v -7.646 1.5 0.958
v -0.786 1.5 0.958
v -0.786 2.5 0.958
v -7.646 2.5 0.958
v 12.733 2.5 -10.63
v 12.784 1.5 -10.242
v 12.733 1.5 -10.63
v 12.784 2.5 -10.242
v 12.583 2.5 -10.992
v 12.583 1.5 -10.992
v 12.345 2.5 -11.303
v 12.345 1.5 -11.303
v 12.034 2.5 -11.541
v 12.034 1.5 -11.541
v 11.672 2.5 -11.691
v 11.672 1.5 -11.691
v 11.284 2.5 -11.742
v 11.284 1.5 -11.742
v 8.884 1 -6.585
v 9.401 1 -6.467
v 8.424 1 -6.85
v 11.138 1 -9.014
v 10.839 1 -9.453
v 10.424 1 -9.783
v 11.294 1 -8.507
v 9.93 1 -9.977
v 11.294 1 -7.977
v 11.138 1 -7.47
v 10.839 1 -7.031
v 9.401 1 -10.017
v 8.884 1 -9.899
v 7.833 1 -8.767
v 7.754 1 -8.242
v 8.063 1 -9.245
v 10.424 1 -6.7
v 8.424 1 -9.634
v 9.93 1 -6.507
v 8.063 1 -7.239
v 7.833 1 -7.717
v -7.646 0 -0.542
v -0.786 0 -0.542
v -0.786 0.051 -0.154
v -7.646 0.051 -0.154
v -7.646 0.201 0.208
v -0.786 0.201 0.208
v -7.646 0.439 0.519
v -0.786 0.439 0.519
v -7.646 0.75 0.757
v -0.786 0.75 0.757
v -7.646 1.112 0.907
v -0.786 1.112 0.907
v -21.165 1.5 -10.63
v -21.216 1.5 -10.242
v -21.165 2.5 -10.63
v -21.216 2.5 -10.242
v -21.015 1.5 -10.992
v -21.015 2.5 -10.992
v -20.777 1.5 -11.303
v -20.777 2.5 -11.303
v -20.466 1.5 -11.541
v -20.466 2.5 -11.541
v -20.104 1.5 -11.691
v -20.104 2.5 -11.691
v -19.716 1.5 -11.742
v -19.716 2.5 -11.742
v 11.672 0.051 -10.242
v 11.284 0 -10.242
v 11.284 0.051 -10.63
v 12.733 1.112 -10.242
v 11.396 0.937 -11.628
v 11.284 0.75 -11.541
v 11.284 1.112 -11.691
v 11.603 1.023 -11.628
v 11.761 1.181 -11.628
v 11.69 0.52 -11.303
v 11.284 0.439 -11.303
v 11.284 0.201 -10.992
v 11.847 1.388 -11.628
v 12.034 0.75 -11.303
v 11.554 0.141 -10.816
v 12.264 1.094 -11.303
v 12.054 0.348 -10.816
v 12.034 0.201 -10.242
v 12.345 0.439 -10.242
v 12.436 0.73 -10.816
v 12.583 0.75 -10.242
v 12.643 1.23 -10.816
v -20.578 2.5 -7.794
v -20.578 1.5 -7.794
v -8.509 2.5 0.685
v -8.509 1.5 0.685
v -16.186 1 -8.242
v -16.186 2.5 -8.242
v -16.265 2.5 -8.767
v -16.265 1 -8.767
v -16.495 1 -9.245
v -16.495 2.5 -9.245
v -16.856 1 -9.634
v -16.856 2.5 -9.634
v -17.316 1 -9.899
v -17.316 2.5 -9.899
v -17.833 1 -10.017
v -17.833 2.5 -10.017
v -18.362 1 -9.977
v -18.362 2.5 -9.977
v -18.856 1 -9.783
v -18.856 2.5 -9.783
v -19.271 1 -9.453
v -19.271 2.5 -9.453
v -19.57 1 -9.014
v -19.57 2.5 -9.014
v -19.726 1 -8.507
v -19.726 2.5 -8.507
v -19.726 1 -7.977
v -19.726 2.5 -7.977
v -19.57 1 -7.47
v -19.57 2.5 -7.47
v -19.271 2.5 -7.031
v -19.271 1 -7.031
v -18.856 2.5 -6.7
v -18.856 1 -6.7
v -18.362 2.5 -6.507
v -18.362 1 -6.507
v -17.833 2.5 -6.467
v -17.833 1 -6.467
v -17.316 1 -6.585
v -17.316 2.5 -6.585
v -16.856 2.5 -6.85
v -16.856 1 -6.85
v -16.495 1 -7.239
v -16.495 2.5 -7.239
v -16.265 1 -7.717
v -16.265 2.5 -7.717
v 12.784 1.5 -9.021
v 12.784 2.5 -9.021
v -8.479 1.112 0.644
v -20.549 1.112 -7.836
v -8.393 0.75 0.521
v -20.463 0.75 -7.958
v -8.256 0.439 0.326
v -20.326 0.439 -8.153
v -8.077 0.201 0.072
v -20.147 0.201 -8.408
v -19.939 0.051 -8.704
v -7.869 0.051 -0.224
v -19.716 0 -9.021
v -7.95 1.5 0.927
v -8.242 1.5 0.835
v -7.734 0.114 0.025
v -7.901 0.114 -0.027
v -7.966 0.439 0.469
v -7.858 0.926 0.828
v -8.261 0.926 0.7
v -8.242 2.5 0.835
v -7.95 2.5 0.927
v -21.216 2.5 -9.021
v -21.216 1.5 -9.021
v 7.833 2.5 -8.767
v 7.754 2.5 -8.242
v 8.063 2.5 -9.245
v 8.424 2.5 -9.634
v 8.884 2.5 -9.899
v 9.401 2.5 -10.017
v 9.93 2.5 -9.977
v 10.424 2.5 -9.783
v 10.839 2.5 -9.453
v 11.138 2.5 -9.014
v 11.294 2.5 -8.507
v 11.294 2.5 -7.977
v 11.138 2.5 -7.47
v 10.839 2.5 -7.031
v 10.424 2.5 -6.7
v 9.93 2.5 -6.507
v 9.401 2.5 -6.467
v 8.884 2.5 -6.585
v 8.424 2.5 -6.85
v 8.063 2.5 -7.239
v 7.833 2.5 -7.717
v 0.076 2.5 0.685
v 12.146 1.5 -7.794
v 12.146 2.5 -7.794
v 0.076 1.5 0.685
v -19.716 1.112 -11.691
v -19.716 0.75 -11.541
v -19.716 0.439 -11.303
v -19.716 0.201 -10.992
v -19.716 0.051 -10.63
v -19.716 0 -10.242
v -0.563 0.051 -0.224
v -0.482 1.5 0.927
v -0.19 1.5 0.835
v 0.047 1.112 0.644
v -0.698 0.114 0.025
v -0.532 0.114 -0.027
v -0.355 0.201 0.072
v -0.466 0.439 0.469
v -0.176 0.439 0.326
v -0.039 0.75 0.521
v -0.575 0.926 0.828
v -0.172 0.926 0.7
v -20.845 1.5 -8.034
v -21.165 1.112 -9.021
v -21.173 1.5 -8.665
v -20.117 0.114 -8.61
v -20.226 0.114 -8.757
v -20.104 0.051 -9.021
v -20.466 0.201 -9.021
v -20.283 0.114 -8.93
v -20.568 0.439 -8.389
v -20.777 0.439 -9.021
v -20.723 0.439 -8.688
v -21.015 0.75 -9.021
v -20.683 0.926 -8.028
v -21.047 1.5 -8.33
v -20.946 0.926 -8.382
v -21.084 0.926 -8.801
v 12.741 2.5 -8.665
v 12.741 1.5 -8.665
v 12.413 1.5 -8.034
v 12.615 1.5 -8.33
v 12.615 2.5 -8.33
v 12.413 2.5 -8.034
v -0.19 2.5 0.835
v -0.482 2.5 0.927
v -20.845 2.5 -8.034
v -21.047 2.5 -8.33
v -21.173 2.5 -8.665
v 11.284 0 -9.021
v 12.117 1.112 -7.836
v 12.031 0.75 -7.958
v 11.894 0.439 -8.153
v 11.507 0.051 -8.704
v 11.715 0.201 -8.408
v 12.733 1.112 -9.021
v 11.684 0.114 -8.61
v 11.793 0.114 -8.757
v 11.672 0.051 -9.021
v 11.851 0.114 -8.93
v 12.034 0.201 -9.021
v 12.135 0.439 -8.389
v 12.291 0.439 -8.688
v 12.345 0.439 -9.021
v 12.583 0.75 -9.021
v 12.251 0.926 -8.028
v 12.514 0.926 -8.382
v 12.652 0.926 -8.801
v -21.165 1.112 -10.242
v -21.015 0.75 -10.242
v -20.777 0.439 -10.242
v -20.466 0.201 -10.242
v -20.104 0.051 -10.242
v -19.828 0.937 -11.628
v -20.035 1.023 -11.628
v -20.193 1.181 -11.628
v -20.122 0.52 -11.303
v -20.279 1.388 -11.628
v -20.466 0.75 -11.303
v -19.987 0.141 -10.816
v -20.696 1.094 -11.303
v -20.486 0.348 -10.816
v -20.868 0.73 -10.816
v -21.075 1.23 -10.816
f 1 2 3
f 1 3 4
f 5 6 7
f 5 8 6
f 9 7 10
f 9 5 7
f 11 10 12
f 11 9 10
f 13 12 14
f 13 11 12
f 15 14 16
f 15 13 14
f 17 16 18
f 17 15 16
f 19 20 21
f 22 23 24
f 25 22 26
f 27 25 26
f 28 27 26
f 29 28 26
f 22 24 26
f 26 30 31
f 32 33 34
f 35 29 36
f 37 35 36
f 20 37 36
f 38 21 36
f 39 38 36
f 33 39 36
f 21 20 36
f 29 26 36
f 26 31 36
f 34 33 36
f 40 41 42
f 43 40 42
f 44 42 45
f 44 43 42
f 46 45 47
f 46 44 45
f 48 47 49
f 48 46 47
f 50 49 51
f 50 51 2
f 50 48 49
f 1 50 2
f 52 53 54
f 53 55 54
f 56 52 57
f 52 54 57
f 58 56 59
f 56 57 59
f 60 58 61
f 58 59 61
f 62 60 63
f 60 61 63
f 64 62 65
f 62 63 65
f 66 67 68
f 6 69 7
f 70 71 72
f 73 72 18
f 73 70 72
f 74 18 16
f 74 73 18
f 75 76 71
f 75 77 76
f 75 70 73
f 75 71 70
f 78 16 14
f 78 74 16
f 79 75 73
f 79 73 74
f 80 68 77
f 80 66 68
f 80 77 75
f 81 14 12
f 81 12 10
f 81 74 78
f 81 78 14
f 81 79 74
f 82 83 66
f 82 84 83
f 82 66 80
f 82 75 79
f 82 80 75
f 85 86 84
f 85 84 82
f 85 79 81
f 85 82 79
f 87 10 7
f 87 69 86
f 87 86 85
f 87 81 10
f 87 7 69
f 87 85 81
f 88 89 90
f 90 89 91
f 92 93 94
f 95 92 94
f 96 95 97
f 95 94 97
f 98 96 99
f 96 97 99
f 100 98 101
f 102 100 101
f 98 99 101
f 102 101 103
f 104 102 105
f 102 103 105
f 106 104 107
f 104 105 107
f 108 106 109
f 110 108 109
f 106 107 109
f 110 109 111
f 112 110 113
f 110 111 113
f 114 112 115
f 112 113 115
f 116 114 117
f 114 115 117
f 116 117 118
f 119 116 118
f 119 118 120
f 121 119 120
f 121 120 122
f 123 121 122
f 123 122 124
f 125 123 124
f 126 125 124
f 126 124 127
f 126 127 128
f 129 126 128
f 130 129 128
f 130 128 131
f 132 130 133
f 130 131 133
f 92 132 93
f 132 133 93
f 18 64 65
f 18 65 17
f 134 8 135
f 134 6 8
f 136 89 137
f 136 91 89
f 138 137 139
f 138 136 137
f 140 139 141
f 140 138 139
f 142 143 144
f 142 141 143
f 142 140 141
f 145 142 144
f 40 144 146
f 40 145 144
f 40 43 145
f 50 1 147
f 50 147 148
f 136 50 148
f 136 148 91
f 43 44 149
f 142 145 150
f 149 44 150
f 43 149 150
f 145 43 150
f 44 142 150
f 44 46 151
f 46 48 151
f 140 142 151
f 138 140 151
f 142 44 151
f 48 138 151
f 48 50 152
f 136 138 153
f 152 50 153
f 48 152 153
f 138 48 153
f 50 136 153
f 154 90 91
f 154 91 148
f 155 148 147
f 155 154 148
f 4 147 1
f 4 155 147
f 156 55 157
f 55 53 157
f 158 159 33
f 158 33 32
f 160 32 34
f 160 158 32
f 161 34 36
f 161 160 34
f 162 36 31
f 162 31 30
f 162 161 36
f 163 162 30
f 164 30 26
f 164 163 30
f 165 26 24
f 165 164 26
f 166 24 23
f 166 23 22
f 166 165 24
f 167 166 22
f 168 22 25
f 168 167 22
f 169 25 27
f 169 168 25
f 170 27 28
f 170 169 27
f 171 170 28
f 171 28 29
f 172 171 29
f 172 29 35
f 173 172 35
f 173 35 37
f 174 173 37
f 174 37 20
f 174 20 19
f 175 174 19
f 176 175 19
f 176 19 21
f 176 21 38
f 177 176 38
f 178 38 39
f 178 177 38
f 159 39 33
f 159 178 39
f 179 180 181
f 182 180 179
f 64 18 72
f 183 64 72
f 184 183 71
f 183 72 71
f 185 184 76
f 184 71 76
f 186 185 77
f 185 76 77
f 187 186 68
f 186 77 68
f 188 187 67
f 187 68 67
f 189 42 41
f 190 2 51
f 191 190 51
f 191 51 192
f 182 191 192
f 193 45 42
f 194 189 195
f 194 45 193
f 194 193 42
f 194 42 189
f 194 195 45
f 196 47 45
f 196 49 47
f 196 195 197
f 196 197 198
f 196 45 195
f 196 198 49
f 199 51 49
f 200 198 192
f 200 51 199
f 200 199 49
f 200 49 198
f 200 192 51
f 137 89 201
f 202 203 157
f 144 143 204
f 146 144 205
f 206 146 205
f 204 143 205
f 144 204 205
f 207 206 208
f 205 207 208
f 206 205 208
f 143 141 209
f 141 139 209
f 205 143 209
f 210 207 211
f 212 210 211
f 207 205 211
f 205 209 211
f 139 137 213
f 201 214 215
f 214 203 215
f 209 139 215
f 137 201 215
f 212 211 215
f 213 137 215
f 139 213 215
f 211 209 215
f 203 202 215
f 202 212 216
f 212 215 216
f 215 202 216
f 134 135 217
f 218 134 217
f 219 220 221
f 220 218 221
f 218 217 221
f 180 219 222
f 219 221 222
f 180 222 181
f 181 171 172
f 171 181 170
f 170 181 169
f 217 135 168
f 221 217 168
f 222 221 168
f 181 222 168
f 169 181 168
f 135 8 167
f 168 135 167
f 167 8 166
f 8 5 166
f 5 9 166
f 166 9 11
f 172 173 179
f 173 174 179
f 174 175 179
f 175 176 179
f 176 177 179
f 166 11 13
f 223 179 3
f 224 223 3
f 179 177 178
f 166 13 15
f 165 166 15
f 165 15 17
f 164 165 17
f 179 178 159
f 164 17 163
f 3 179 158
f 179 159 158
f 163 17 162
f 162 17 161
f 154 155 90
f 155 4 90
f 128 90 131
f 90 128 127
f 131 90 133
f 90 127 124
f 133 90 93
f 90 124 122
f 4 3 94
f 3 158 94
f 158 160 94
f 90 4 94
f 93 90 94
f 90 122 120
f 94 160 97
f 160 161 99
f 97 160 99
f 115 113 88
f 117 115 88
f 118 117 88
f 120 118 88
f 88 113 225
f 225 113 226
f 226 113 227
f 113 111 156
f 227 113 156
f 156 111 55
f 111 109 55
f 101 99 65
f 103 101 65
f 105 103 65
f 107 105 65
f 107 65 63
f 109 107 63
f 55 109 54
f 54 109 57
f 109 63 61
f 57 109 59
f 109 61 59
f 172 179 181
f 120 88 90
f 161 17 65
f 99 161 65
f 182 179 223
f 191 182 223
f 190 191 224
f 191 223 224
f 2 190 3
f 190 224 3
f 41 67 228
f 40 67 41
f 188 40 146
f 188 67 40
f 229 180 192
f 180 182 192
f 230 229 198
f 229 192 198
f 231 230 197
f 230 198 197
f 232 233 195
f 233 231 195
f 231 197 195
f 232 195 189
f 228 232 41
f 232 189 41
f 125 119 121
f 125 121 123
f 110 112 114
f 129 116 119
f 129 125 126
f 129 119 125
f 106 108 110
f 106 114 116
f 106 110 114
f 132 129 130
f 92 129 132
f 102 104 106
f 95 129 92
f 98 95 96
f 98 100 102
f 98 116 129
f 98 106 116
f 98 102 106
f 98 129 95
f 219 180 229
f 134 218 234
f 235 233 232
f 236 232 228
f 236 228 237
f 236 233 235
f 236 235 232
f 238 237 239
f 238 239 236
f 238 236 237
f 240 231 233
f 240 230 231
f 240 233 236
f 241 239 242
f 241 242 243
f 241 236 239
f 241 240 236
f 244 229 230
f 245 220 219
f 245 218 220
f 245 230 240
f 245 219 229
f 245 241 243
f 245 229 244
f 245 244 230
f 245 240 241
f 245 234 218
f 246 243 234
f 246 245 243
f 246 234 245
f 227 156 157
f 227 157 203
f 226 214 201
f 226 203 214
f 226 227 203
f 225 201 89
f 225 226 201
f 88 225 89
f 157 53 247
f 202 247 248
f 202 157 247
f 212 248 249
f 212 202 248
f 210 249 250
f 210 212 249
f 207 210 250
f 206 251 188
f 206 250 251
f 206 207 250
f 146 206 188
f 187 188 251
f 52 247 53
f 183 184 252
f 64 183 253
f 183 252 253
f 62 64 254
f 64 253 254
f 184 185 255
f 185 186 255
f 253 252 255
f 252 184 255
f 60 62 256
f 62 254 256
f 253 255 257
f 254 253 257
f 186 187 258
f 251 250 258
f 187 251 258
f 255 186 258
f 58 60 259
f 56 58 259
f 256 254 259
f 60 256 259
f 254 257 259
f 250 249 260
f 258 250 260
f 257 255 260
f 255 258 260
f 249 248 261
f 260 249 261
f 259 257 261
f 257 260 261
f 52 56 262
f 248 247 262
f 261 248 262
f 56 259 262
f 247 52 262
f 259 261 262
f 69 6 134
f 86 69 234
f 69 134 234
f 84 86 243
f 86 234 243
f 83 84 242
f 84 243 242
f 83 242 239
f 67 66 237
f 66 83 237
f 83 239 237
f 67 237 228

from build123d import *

# Parameters (mm, degrees)
BOSS_EXTRUDE1_DEPTH = 2.5
SKETCH2_R           = 1.78
CUT_EXTRUDE1_DEPTH  = 1.5
FILLET1_R           = 1.5


with BuildPart() as part:
    # Sketch1 → Boss-Extrude1 (new body)
    with BuildSketch(Plane(origin=(0, 0, 0), x_dir=(1, 0, 0), z_dir=(0, 1, 0))):
        Polygon((-21.216153836, 11.741903429), (-21.216153836, 8.241903429), (-8.120509951, -0.958096571), (-4.216153836, -0.958096571), (-4.216153836, 11.741903429), align=None)
    extrude(amount=BOSS_EXTRUDE1_DEPTH)

    # Sketch2 → Cut-Extrude1 (cut)
    with BuildSketch(Plane(origin=(0, 2.5, 0), x_dir=(1, 0, 0), z_dir=(0, 1, 0))):
        with Locations((-17.966153836, 8.241903429)):
            Circle(SKETCH2_R)
    extrude(amount=-CUT_EXTRUDE1_DEPTH, mode=Mode.SUBTRACT)

    # Fillet1
    fillet1_edges = [part.edges().sort_by_distance(p)[0] for p in [
        (-6.168331894, 0, 0.958096571),
        (-14.668331894, 0, -3.641903429),
        (-21.216153836, 0, -9.991903429),
        (-12.716153836, 0, -11.741903429),
        (-8.120509951, 1.25, 0.958096571),
        (-21.216153836, 1.25, -8.241903429),
        (-21.216153836, 1.25, -11.741903429),
    ]]
    fillet(fillet1_edges, radius=FILLET1_R)

    # Mirror1: part across plane


with BuildPart() as part_1:
    add(part.part)
    add(part.part.mirror(Plane(origin=(-4.216153836, 2.5, 0.958096571), x_dir=(0, 0, 1), z_dir=(-1, 0, 0))))


solid = part_1.part
